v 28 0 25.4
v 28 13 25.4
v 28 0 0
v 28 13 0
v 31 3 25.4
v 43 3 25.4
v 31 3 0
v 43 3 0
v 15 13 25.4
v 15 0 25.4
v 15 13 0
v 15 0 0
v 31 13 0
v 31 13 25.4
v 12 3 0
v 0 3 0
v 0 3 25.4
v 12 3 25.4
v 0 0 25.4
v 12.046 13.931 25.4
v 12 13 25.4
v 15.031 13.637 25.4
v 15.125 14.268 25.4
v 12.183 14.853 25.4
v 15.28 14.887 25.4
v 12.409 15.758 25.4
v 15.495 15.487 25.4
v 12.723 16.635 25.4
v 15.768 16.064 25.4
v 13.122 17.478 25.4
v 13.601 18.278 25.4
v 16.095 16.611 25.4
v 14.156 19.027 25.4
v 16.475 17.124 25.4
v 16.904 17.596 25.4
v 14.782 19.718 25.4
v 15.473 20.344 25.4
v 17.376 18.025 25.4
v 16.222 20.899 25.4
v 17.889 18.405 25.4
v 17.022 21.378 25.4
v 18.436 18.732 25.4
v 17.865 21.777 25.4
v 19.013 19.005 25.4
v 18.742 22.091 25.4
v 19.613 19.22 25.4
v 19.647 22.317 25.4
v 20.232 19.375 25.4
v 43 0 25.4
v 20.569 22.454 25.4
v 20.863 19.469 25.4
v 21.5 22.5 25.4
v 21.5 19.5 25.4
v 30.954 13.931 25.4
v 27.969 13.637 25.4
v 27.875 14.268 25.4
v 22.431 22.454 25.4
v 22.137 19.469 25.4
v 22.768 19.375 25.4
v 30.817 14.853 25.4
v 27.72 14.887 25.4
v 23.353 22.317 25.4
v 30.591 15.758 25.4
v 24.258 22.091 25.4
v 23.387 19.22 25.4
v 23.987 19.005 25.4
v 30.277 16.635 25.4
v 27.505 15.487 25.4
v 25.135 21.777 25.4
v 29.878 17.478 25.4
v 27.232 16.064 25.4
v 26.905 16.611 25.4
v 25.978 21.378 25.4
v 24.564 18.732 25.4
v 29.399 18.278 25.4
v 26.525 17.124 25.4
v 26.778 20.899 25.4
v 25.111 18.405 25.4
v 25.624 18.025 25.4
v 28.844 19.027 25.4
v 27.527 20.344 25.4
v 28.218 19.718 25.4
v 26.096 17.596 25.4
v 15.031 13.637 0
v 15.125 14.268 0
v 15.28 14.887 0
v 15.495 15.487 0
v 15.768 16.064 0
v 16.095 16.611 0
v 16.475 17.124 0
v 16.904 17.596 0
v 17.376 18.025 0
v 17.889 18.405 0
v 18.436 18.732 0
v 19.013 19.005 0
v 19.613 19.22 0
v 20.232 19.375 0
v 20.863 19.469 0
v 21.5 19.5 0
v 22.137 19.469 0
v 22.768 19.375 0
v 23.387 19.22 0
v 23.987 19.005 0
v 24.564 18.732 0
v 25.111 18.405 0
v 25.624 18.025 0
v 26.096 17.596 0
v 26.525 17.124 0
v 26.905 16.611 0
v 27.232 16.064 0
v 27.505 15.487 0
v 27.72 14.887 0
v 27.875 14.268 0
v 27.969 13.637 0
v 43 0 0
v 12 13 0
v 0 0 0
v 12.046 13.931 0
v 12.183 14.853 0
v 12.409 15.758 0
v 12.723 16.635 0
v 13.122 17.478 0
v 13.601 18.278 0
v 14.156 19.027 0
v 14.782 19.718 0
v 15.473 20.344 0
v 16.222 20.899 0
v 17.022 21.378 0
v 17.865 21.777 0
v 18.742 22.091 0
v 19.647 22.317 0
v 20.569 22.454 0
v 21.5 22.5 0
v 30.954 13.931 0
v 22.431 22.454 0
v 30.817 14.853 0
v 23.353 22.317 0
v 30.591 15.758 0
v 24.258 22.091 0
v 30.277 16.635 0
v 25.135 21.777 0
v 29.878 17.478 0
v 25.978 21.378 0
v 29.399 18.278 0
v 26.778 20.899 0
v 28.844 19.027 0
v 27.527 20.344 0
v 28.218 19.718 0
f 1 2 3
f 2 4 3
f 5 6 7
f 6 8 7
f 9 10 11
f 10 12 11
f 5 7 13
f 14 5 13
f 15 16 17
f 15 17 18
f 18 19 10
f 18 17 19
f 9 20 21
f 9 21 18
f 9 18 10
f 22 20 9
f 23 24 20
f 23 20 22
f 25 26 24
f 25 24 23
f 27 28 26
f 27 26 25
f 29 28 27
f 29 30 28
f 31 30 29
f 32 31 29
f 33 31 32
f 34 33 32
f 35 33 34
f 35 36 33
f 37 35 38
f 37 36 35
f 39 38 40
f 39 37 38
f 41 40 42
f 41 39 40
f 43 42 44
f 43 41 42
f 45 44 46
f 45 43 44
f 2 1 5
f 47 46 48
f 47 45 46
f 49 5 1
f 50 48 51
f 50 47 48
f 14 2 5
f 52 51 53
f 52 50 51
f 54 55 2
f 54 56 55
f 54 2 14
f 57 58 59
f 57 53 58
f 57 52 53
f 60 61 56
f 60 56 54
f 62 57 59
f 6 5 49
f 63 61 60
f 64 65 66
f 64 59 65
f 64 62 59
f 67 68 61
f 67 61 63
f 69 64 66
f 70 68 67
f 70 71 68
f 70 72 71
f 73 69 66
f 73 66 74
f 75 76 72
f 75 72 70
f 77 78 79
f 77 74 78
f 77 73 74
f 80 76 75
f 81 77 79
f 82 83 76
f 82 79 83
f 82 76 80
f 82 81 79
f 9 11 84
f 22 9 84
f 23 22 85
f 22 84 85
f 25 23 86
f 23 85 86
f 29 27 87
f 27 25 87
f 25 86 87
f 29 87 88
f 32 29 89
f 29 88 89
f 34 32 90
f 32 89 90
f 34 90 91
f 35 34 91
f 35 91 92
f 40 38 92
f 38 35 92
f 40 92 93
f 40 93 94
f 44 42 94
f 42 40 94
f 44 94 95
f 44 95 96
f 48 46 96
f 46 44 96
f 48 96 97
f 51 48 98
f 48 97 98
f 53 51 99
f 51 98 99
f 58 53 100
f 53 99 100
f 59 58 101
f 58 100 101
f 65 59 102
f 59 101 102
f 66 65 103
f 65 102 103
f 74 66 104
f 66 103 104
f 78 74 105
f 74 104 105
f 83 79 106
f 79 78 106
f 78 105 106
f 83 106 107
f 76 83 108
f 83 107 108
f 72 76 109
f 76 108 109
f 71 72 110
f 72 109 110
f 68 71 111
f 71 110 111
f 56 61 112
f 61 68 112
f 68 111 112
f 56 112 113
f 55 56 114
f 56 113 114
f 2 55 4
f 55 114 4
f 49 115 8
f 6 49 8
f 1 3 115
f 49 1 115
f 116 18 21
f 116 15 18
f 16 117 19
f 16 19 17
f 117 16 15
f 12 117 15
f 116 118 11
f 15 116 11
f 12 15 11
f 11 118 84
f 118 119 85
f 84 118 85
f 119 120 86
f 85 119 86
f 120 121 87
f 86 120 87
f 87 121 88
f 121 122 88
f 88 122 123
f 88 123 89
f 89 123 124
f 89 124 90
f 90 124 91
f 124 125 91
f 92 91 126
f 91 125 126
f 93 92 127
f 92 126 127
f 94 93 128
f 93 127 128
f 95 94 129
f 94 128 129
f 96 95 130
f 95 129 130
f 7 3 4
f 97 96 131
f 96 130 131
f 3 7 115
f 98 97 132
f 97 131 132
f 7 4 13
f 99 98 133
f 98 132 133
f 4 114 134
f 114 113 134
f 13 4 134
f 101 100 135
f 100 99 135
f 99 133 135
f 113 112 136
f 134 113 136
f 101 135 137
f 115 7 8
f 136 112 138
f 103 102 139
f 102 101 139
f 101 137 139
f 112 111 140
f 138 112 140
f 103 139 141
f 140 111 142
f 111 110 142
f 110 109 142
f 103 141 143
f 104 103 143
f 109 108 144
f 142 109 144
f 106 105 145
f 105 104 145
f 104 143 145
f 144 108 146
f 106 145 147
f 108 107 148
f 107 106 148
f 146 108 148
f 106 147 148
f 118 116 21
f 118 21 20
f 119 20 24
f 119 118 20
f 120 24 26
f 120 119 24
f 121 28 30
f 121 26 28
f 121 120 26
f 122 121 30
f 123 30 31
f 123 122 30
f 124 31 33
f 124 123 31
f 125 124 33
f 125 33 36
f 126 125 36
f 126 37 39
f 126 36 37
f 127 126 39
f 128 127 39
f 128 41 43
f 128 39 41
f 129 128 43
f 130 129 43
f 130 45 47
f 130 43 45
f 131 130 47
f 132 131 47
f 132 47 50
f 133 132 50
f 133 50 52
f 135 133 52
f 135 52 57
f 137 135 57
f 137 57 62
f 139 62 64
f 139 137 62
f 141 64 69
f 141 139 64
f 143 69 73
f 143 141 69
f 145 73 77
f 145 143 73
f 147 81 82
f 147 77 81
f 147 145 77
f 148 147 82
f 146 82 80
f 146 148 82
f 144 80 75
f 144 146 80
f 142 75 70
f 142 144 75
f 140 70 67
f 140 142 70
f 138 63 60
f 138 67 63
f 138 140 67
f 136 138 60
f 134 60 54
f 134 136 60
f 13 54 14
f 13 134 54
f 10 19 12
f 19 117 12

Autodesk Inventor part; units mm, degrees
ref_plane "YZ Plane" through (0, 0, 0) normal (1, 0, 0) x (0, 1, 0)
ref_plane "XZ Plane" through (0, 0, 0) normal (0, 1, 0) x (-1, 0, 0)
ref_plane "XY Plane" through (0, 0, 0) normal (0, 0, 1) x (1, 0, 0)
sketch "Sketch1" plane through (0, 0, 0) normal (0, 0, 1) x (1, 0, 0)
  line L0 (0, 0) -> (0, 3)
  line L1 (0, 3) -> (12, 3)
  line L2 (0, 0) -> (15, 0)
  line L3 (15, 0) -> (15, 13)
  line L4 (12, 3) -> (12, 13)
  line L5 (28, 13) -> (28, 0)
  line L6 (28, 0) -> (43, 0)
  line L7 (43, 0) -> (43, 3)
  line L8 (43, 3) -> (31, 3)
  line L9 (31, 3) -> (31, 13)
  arc A0 (28, 13) -> (15, 13) centre (21.5, 13) ccw
  arc A1 (31, 13) -> (12, 13) centre (21.5, 13) ccw
  dimension "d10" = 3
extrude "Extrusion1" add sketch "Sketch1" along normal blind 25.4
properties part number "SADDLE_CPY"
